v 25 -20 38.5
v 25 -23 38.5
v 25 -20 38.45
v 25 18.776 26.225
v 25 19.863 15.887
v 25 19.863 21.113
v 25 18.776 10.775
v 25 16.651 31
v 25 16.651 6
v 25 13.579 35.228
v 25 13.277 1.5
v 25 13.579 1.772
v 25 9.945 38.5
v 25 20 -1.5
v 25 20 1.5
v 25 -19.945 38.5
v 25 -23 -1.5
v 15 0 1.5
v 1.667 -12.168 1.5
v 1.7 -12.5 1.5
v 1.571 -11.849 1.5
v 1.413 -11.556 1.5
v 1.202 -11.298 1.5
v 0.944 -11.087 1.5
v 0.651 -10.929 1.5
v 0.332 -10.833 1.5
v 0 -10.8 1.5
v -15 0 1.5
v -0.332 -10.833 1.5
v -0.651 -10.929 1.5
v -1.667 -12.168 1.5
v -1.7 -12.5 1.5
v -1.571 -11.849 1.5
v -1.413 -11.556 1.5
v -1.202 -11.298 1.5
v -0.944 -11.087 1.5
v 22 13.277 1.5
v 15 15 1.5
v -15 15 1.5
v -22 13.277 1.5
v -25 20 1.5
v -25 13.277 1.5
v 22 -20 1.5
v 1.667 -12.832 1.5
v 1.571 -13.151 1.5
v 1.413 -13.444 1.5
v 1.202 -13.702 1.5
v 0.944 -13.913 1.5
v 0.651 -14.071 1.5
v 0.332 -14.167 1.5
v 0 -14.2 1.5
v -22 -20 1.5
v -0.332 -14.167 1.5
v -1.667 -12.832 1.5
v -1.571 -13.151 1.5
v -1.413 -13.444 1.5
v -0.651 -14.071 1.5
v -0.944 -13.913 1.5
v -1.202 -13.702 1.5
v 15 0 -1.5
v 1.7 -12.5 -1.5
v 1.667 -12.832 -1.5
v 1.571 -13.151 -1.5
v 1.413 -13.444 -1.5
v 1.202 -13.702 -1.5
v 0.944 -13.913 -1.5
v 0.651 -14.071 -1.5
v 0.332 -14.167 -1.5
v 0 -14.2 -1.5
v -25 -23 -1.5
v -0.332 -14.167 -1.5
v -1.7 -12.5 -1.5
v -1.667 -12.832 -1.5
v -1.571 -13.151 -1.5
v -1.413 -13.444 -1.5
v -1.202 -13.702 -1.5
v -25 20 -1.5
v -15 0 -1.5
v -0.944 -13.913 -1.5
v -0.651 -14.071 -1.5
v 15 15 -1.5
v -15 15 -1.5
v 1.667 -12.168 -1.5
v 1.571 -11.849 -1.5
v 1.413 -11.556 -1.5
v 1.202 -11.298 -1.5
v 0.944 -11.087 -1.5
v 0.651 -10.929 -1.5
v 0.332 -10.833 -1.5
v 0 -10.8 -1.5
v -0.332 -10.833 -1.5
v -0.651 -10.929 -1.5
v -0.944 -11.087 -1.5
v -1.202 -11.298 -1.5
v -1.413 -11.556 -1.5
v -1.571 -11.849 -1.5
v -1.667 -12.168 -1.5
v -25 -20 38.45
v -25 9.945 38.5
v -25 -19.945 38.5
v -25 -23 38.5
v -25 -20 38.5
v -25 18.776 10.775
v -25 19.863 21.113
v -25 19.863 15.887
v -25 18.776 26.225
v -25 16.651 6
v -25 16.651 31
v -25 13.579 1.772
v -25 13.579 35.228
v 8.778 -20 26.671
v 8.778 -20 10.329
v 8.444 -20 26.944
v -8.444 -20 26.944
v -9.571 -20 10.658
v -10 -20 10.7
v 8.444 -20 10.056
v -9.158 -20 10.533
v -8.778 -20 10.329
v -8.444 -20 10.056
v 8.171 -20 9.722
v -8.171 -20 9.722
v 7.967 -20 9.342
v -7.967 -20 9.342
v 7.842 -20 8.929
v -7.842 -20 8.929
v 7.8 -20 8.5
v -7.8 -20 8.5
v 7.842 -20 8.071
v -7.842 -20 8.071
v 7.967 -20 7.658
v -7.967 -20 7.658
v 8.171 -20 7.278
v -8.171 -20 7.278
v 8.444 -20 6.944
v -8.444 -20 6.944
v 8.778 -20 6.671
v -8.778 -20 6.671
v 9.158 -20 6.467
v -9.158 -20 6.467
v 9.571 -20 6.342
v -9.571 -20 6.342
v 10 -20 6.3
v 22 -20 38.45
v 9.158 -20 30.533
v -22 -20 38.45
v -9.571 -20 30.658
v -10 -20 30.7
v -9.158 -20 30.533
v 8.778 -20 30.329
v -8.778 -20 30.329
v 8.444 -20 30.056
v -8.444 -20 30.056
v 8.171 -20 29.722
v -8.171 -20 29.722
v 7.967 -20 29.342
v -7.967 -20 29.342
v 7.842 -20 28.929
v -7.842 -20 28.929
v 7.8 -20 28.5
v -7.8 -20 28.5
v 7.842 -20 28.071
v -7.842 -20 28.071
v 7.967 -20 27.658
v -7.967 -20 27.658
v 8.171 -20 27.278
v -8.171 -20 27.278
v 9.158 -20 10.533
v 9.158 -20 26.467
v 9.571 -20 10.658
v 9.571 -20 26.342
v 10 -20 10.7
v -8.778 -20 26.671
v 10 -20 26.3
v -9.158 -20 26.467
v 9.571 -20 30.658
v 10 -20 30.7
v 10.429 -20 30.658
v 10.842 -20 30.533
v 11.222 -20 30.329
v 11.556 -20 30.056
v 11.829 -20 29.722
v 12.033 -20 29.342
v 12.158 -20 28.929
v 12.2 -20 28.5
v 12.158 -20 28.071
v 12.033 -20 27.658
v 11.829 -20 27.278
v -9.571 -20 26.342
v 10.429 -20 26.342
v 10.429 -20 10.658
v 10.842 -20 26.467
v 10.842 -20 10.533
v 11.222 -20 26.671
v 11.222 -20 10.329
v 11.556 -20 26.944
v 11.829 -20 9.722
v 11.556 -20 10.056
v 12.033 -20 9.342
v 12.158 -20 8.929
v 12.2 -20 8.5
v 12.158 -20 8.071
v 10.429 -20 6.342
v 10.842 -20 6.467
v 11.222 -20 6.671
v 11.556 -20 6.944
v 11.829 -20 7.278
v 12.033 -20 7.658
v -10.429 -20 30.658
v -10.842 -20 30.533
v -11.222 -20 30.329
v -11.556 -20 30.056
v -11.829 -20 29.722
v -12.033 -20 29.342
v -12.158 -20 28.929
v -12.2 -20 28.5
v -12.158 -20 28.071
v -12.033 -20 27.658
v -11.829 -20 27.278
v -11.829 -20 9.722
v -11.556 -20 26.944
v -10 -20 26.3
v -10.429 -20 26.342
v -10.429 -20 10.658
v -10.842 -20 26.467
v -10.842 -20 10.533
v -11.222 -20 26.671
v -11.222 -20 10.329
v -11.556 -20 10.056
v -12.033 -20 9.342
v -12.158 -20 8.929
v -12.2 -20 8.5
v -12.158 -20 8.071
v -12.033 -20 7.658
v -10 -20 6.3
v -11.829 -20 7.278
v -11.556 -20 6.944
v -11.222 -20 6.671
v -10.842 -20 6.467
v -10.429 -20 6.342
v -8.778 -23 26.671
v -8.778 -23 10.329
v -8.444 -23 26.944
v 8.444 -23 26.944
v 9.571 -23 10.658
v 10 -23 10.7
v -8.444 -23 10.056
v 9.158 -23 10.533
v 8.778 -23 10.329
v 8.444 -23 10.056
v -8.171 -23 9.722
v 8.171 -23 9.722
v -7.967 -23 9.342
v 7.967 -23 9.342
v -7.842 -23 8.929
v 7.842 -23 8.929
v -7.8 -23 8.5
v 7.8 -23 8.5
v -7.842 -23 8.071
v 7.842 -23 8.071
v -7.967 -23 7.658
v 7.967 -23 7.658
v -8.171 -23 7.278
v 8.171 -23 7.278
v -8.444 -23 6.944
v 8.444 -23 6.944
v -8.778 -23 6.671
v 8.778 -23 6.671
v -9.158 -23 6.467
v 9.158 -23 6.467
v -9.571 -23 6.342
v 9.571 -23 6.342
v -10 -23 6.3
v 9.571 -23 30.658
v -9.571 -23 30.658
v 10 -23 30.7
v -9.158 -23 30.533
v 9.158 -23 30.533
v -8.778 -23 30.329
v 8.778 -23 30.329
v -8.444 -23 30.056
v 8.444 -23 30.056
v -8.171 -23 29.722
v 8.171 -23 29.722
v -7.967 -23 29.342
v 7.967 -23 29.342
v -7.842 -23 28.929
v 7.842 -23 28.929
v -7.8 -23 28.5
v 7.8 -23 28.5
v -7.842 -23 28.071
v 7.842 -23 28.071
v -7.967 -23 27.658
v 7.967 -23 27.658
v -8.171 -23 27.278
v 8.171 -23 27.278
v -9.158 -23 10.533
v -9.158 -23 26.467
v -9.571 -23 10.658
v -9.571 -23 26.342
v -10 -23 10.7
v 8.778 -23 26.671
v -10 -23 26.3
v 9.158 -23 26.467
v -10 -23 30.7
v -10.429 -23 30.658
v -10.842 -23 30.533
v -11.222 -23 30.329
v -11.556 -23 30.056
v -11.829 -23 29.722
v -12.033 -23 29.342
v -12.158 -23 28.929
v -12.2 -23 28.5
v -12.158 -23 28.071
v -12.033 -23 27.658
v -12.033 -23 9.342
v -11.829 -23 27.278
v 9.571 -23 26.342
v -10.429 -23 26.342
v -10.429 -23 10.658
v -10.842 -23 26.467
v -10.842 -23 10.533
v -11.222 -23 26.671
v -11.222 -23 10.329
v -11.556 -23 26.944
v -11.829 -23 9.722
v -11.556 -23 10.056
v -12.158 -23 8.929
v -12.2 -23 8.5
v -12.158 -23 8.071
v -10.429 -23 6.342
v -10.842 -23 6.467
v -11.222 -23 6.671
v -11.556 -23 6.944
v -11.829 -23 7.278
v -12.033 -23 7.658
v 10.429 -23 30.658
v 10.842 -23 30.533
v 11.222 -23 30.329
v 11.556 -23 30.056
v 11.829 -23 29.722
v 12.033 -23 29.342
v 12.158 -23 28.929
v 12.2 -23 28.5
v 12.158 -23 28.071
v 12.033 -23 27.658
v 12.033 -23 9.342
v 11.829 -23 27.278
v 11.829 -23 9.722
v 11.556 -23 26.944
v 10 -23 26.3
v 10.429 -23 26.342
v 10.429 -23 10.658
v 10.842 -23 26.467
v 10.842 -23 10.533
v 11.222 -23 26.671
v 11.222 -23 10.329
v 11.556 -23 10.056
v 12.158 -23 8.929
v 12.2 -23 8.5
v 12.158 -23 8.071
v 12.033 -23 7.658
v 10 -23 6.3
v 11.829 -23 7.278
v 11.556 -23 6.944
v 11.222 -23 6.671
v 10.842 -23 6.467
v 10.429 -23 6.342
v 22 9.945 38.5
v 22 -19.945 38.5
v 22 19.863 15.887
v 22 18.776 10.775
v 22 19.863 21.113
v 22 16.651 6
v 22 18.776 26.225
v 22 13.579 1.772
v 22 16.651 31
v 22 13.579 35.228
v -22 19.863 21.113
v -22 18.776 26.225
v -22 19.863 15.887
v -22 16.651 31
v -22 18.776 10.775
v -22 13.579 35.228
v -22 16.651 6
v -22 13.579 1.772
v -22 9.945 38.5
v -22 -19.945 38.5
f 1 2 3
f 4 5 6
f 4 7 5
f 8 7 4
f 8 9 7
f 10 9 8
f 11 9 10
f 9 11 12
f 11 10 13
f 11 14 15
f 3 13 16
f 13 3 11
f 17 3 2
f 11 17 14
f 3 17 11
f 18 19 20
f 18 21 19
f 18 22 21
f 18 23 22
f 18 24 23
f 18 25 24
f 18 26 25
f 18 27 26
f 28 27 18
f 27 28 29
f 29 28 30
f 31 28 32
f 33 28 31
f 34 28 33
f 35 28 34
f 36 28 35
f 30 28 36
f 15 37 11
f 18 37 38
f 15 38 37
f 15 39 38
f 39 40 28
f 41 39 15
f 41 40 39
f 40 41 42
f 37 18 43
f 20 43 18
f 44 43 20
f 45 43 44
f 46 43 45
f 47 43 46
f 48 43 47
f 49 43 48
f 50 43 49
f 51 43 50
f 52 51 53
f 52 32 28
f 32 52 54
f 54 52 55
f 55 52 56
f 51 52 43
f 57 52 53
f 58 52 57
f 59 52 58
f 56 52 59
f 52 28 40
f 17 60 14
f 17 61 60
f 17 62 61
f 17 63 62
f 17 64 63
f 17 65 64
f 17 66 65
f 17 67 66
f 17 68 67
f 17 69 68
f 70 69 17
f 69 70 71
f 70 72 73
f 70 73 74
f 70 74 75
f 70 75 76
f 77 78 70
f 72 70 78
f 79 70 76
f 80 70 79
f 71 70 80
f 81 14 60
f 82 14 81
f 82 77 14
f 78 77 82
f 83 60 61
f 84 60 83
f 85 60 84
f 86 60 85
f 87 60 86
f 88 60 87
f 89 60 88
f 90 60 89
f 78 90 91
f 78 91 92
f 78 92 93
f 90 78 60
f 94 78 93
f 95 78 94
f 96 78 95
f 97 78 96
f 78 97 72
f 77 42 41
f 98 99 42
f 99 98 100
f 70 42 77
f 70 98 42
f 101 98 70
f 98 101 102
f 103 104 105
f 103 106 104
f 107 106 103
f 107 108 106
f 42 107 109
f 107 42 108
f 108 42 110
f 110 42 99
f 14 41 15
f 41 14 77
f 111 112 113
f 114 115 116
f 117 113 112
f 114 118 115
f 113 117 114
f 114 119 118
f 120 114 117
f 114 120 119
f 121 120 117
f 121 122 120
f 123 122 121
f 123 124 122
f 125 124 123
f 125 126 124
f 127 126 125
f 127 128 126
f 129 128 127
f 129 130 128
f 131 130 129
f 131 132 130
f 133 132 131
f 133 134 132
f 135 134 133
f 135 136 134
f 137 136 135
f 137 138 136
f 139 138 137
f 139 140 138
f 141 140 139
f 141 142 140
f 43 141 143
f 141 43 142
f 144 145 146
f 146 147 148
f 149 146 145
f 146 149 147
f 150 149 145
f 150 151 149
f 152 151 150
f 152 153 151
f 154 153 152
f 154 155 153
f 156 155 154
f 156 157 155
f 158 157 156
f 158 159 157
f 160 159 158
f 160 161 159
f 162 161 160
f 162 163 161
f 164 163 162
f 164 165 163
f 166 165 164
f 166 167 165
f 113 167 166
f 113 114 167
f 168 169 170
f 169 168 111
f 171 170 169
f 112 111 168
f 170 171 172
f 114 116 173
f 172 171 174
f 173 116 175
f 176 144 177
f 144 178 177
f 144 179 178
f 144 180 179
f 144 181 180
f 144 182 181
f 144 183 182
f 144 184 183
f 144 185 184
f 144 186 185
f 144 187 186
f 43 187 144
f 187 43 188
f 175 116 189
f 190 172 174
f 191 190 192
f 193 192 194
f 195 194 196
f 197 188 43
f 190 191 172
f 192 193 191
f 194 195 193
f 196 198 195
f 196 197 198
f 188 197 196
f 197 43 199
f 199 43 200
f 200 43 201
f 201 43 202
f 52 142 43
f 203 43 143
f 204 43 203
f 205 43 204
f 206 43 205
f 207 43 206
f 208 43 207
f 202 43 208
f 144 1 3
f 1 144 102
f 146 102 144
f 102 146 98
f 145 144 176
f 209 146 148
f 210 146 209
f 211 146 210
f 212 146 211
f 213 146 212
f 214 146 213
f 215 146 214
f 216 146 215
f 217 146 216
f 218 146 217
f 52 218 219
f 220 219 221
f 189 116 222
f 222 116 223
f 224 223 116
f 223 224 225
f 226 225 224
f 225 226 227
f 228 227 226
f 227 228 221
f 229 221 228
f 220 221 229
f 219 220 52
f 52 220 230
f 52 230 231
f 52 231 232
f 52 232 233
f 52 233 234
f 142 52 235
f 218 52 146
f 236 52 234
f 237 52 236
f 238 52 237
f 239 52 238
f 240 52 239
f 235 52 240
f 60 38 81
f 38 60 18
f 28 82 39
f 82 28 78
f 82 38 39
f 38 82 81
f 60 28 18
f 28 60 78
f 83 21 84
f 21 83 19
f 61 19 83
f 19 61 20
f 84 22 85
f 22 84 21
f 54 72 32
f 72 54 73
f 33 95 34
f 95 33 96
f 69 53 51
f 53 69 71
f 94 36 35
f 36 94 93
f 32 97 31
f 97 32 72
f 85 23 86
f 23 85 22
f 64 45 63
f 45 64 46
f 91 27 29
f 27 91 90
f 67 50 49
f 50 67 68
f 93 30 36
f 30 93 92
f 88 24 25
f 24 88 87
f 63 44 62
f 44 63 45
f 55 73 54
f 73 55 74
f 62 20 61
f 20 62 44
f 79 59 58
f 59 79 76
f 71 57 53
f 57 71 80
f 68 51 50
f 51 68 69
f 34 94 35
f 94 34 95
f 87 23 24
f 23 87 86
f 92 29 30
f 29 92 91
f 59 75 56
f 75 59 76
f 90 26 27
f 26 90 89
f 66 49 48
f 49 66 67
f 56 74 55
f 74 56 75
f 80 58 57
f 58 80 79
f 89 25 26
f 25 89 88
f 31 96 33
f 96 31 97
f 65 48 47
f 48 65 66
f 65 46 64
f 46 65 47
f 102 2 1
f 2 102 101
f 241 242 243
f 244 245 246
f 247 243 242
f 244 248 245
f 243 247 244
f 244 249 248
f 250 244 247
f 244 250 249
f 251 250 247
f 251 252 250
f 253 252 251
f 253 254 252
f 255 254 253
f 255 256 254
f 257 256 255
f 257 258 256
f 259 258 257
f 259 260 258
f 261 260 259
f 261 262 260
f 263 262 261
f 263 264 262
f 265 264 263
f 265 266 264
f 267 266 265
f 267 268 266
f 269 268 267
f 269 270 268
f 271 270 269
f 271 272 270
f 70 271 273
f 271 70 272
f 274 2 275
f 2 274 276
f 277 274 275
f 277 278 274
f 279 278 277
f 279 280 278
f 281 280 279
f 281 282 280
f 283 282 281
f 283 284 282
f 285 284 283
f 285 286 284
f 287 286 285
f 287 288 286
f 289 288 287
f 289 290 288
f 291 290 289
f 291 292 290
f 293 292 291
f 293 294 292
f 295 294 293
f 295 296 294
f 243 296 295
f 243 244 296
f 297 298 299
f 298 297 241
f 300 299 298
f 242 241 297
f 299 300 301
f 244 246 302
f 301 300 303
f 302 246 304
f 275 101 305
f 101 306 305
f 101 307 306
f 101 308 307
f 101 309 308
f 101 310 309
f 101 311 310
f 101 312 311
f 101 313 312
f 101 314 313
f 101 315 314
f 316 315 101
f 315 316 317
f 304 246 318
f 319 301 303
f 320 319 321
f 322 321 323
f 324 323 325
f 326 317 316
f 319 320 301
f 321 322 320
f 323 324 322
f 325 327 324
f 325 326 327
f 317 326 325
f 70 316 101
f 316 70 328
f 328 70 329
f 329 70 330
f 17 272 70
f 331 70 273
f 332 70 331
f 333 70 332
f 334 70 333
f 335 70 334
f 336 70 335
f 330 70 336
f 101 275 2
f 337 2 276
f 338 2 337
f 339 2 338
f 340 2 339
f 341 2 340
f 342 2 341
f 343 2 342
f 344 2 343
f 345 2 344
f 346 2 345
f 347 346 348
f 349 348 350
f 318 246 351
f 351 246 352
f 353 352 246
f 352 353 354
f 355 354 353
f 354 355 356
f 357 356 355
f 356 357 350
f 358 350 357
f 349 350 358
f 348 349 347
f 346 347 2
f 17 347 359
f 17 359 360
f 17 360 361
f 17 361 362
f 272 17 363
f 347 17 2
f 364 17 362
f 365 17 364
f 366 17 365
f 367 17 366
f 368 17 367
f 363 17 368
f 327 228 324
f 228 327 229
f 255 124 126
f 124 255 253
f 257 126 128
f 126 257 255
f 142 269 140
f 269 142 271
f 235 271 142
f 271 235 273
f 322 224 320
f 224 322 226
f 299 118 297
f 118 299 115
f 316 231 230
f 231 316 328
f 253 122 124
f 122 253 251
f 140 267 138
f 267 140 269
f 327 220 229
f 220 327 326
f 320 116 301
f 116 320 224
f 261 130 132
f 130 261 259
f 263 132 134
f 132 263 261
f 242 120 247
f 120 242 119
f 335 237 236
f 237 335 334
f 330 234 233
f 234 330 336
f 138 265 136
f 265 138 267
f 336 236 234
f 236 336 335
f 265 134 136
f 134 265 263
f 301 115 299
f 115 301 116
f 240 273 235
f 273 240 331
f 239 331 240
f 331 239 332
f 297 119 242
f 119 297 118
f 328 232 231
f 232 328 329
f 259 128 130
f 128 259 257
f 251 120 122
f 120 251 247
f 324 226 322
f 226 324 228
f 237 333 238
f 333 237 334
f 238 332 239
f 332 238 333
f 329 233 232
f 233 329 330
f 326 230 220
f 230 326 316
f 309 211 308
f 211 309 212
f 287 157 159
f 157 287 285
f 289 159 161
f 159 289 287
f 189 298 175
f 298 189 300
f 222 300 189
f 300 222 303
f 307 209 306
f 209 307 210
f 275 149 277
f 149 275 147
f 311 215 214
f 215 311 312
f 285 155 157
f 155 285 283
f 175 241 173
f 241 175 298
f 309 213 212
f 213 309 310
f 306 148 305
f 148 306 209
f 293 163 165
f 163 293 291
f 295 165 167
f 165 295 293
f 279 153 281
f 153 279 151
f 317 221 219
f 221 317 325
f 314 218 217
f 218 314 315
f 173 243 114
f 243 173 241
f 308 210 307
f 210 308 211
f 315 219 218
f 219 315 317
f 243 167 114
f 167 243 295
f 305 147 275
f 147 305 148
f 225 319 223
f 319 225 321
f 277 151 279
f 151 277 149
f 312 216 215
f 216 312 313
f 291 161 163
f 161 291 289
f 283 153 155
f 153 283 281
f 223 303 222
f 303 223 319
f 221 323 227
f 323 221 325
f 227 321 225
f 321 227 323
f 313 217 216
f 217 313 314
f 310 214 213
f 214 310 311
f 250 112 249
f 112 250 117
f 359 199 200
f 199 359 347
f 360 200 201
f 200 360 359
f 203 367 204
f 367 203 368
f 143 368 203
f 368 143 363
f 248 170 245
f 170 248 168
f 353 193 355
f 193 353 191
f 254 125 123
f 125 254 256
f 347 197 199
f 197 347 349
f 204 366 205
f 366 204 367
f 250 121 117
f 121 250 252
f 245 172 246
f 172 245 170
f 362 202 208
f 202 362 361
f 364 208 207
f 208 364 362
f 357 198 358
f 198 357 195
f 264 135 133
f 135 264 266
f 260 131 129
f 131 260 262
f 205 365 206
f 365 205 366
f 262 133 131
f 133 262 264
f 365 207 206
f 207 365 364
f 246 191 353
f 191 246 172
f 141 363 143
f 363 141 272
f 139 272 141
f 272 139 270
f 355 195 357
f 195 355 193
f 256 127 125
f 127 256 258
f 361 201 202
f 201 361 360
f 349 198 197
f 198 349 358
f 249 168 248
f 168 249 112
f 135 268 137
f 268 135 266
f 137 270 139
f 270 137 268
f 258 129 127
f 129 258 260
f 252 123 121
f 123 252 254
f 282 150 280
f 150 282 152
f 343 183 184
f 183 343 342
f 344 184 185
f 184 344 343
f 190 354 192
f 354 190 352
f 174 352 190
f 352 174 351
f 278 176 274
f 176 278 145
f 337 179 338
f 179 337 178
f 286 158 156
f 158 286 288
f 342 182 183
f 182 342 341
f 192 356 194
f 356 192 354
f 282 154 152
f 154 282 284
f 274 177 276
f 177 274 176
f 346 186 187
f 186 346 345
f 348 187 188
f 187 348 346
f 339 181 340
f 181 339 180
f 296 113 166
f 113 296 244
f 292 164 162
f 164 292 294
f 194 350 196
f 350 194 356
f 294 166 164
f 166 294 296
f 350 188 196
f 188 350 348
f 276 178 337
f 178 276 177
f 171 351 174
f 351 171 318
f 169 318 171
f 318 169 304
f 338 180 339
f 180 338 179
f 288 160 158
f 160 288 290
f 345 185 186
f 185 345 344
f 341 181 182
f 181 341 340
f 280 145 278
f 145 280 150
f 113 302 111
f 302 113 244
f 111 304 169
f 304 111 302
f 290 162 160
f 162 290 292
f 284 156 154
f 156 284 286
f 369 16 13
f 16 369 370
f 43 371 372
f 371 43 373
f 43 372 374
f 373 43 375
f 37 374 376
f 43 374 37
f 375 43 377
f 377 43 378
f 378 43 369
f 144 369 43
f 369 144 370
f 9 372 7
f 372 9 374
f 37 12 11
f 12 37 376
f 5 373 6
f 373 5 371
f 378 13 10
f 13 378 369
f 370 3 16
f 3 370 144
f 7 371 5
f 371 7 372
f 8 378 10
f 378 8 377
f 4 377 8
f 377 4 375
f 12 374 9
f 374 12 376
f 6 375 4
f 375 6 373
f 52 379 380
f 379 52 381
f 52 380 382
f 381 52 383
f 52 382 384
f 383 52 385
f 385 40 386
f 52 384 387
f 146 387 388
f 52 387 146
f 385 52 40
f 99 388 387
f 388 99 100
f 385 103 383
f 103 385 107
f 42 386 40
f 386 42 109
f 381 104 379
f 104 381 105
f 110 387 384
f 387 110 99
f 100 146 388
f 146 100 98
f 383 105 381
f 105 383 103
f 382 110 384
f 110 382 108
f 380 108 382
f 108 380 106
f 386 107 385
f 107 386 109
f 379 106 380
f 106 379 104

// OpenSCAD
cow= 30;
col= 15;
coh= 24;
hd= 12.5;
w= 40+10;
o= col/2;
l= col+hd+col/2+5;
h= 3;
ht= 40;


module eswitch() {
	translate([-40/2, -30/2,0]) cube([40,30, 10]);
	translate([0,0,10]) cylinder(r=30/2, h=32);
	translate([0,0,32+10]) cylinder(r=40/2, h=3);
	translate([-cow/2, -30+col, -coh]) cube([cow, col, coh]);
}

module base() {
	difference() {
		cube([w, l, h], center=true);
		translate([0,o,0]) cube([cow, col, h], center= true);
		translate([0,-hd,0]) cylinder(r= 3/2+0.2, h= h, center=true, $fn=32);
	}
}

module flange() {
	difference() {
		translate([-w/2, -h, 0]) cube([w, h, ht]);
		#translate([-10,0,ht/2-10]) rotate([90,0,0]) cylinder(r= 4/2+0.2, h= h+5, center=true, $fn=32);
		#translate([-10,0,ht/2+10]) rotate([90,0,0]) cylinder(r= 4/2+0.2, h= h+5, center=true, $fn=32);
		#translate([10,0,ht/2-10]) rotate([90,0,0]) cylinder(r= 4/2+0.2, h= h+5, center=true, $fn=32);
		#translate([10,0,ht/2+10]) rotate([90,0,0]) cylinder(r= 4/2+0.2, h= h+5, center=true, $fn=32);

	}
}

module side() {
	translate([0, 0, ht/2-h/2]){
		intersection() {
			cube(size=[h, l, ht], center=true);
			translate([0, -5, 0])  rotate([0, 90, 0]) cylinder(r=25, h=h*2, center=true);
		}
	}
}

module holder() {
	union() {
		base();
		translate([0,-l/2,-h/2]) flange();
		translate([w/2-h/2, 0, 0])  side();
		translate([-w/2+h/2, 0, 0])  side();
	}
}

holder();
%translate([0,0,0]) rotate([180,0,0]) eswitch();
